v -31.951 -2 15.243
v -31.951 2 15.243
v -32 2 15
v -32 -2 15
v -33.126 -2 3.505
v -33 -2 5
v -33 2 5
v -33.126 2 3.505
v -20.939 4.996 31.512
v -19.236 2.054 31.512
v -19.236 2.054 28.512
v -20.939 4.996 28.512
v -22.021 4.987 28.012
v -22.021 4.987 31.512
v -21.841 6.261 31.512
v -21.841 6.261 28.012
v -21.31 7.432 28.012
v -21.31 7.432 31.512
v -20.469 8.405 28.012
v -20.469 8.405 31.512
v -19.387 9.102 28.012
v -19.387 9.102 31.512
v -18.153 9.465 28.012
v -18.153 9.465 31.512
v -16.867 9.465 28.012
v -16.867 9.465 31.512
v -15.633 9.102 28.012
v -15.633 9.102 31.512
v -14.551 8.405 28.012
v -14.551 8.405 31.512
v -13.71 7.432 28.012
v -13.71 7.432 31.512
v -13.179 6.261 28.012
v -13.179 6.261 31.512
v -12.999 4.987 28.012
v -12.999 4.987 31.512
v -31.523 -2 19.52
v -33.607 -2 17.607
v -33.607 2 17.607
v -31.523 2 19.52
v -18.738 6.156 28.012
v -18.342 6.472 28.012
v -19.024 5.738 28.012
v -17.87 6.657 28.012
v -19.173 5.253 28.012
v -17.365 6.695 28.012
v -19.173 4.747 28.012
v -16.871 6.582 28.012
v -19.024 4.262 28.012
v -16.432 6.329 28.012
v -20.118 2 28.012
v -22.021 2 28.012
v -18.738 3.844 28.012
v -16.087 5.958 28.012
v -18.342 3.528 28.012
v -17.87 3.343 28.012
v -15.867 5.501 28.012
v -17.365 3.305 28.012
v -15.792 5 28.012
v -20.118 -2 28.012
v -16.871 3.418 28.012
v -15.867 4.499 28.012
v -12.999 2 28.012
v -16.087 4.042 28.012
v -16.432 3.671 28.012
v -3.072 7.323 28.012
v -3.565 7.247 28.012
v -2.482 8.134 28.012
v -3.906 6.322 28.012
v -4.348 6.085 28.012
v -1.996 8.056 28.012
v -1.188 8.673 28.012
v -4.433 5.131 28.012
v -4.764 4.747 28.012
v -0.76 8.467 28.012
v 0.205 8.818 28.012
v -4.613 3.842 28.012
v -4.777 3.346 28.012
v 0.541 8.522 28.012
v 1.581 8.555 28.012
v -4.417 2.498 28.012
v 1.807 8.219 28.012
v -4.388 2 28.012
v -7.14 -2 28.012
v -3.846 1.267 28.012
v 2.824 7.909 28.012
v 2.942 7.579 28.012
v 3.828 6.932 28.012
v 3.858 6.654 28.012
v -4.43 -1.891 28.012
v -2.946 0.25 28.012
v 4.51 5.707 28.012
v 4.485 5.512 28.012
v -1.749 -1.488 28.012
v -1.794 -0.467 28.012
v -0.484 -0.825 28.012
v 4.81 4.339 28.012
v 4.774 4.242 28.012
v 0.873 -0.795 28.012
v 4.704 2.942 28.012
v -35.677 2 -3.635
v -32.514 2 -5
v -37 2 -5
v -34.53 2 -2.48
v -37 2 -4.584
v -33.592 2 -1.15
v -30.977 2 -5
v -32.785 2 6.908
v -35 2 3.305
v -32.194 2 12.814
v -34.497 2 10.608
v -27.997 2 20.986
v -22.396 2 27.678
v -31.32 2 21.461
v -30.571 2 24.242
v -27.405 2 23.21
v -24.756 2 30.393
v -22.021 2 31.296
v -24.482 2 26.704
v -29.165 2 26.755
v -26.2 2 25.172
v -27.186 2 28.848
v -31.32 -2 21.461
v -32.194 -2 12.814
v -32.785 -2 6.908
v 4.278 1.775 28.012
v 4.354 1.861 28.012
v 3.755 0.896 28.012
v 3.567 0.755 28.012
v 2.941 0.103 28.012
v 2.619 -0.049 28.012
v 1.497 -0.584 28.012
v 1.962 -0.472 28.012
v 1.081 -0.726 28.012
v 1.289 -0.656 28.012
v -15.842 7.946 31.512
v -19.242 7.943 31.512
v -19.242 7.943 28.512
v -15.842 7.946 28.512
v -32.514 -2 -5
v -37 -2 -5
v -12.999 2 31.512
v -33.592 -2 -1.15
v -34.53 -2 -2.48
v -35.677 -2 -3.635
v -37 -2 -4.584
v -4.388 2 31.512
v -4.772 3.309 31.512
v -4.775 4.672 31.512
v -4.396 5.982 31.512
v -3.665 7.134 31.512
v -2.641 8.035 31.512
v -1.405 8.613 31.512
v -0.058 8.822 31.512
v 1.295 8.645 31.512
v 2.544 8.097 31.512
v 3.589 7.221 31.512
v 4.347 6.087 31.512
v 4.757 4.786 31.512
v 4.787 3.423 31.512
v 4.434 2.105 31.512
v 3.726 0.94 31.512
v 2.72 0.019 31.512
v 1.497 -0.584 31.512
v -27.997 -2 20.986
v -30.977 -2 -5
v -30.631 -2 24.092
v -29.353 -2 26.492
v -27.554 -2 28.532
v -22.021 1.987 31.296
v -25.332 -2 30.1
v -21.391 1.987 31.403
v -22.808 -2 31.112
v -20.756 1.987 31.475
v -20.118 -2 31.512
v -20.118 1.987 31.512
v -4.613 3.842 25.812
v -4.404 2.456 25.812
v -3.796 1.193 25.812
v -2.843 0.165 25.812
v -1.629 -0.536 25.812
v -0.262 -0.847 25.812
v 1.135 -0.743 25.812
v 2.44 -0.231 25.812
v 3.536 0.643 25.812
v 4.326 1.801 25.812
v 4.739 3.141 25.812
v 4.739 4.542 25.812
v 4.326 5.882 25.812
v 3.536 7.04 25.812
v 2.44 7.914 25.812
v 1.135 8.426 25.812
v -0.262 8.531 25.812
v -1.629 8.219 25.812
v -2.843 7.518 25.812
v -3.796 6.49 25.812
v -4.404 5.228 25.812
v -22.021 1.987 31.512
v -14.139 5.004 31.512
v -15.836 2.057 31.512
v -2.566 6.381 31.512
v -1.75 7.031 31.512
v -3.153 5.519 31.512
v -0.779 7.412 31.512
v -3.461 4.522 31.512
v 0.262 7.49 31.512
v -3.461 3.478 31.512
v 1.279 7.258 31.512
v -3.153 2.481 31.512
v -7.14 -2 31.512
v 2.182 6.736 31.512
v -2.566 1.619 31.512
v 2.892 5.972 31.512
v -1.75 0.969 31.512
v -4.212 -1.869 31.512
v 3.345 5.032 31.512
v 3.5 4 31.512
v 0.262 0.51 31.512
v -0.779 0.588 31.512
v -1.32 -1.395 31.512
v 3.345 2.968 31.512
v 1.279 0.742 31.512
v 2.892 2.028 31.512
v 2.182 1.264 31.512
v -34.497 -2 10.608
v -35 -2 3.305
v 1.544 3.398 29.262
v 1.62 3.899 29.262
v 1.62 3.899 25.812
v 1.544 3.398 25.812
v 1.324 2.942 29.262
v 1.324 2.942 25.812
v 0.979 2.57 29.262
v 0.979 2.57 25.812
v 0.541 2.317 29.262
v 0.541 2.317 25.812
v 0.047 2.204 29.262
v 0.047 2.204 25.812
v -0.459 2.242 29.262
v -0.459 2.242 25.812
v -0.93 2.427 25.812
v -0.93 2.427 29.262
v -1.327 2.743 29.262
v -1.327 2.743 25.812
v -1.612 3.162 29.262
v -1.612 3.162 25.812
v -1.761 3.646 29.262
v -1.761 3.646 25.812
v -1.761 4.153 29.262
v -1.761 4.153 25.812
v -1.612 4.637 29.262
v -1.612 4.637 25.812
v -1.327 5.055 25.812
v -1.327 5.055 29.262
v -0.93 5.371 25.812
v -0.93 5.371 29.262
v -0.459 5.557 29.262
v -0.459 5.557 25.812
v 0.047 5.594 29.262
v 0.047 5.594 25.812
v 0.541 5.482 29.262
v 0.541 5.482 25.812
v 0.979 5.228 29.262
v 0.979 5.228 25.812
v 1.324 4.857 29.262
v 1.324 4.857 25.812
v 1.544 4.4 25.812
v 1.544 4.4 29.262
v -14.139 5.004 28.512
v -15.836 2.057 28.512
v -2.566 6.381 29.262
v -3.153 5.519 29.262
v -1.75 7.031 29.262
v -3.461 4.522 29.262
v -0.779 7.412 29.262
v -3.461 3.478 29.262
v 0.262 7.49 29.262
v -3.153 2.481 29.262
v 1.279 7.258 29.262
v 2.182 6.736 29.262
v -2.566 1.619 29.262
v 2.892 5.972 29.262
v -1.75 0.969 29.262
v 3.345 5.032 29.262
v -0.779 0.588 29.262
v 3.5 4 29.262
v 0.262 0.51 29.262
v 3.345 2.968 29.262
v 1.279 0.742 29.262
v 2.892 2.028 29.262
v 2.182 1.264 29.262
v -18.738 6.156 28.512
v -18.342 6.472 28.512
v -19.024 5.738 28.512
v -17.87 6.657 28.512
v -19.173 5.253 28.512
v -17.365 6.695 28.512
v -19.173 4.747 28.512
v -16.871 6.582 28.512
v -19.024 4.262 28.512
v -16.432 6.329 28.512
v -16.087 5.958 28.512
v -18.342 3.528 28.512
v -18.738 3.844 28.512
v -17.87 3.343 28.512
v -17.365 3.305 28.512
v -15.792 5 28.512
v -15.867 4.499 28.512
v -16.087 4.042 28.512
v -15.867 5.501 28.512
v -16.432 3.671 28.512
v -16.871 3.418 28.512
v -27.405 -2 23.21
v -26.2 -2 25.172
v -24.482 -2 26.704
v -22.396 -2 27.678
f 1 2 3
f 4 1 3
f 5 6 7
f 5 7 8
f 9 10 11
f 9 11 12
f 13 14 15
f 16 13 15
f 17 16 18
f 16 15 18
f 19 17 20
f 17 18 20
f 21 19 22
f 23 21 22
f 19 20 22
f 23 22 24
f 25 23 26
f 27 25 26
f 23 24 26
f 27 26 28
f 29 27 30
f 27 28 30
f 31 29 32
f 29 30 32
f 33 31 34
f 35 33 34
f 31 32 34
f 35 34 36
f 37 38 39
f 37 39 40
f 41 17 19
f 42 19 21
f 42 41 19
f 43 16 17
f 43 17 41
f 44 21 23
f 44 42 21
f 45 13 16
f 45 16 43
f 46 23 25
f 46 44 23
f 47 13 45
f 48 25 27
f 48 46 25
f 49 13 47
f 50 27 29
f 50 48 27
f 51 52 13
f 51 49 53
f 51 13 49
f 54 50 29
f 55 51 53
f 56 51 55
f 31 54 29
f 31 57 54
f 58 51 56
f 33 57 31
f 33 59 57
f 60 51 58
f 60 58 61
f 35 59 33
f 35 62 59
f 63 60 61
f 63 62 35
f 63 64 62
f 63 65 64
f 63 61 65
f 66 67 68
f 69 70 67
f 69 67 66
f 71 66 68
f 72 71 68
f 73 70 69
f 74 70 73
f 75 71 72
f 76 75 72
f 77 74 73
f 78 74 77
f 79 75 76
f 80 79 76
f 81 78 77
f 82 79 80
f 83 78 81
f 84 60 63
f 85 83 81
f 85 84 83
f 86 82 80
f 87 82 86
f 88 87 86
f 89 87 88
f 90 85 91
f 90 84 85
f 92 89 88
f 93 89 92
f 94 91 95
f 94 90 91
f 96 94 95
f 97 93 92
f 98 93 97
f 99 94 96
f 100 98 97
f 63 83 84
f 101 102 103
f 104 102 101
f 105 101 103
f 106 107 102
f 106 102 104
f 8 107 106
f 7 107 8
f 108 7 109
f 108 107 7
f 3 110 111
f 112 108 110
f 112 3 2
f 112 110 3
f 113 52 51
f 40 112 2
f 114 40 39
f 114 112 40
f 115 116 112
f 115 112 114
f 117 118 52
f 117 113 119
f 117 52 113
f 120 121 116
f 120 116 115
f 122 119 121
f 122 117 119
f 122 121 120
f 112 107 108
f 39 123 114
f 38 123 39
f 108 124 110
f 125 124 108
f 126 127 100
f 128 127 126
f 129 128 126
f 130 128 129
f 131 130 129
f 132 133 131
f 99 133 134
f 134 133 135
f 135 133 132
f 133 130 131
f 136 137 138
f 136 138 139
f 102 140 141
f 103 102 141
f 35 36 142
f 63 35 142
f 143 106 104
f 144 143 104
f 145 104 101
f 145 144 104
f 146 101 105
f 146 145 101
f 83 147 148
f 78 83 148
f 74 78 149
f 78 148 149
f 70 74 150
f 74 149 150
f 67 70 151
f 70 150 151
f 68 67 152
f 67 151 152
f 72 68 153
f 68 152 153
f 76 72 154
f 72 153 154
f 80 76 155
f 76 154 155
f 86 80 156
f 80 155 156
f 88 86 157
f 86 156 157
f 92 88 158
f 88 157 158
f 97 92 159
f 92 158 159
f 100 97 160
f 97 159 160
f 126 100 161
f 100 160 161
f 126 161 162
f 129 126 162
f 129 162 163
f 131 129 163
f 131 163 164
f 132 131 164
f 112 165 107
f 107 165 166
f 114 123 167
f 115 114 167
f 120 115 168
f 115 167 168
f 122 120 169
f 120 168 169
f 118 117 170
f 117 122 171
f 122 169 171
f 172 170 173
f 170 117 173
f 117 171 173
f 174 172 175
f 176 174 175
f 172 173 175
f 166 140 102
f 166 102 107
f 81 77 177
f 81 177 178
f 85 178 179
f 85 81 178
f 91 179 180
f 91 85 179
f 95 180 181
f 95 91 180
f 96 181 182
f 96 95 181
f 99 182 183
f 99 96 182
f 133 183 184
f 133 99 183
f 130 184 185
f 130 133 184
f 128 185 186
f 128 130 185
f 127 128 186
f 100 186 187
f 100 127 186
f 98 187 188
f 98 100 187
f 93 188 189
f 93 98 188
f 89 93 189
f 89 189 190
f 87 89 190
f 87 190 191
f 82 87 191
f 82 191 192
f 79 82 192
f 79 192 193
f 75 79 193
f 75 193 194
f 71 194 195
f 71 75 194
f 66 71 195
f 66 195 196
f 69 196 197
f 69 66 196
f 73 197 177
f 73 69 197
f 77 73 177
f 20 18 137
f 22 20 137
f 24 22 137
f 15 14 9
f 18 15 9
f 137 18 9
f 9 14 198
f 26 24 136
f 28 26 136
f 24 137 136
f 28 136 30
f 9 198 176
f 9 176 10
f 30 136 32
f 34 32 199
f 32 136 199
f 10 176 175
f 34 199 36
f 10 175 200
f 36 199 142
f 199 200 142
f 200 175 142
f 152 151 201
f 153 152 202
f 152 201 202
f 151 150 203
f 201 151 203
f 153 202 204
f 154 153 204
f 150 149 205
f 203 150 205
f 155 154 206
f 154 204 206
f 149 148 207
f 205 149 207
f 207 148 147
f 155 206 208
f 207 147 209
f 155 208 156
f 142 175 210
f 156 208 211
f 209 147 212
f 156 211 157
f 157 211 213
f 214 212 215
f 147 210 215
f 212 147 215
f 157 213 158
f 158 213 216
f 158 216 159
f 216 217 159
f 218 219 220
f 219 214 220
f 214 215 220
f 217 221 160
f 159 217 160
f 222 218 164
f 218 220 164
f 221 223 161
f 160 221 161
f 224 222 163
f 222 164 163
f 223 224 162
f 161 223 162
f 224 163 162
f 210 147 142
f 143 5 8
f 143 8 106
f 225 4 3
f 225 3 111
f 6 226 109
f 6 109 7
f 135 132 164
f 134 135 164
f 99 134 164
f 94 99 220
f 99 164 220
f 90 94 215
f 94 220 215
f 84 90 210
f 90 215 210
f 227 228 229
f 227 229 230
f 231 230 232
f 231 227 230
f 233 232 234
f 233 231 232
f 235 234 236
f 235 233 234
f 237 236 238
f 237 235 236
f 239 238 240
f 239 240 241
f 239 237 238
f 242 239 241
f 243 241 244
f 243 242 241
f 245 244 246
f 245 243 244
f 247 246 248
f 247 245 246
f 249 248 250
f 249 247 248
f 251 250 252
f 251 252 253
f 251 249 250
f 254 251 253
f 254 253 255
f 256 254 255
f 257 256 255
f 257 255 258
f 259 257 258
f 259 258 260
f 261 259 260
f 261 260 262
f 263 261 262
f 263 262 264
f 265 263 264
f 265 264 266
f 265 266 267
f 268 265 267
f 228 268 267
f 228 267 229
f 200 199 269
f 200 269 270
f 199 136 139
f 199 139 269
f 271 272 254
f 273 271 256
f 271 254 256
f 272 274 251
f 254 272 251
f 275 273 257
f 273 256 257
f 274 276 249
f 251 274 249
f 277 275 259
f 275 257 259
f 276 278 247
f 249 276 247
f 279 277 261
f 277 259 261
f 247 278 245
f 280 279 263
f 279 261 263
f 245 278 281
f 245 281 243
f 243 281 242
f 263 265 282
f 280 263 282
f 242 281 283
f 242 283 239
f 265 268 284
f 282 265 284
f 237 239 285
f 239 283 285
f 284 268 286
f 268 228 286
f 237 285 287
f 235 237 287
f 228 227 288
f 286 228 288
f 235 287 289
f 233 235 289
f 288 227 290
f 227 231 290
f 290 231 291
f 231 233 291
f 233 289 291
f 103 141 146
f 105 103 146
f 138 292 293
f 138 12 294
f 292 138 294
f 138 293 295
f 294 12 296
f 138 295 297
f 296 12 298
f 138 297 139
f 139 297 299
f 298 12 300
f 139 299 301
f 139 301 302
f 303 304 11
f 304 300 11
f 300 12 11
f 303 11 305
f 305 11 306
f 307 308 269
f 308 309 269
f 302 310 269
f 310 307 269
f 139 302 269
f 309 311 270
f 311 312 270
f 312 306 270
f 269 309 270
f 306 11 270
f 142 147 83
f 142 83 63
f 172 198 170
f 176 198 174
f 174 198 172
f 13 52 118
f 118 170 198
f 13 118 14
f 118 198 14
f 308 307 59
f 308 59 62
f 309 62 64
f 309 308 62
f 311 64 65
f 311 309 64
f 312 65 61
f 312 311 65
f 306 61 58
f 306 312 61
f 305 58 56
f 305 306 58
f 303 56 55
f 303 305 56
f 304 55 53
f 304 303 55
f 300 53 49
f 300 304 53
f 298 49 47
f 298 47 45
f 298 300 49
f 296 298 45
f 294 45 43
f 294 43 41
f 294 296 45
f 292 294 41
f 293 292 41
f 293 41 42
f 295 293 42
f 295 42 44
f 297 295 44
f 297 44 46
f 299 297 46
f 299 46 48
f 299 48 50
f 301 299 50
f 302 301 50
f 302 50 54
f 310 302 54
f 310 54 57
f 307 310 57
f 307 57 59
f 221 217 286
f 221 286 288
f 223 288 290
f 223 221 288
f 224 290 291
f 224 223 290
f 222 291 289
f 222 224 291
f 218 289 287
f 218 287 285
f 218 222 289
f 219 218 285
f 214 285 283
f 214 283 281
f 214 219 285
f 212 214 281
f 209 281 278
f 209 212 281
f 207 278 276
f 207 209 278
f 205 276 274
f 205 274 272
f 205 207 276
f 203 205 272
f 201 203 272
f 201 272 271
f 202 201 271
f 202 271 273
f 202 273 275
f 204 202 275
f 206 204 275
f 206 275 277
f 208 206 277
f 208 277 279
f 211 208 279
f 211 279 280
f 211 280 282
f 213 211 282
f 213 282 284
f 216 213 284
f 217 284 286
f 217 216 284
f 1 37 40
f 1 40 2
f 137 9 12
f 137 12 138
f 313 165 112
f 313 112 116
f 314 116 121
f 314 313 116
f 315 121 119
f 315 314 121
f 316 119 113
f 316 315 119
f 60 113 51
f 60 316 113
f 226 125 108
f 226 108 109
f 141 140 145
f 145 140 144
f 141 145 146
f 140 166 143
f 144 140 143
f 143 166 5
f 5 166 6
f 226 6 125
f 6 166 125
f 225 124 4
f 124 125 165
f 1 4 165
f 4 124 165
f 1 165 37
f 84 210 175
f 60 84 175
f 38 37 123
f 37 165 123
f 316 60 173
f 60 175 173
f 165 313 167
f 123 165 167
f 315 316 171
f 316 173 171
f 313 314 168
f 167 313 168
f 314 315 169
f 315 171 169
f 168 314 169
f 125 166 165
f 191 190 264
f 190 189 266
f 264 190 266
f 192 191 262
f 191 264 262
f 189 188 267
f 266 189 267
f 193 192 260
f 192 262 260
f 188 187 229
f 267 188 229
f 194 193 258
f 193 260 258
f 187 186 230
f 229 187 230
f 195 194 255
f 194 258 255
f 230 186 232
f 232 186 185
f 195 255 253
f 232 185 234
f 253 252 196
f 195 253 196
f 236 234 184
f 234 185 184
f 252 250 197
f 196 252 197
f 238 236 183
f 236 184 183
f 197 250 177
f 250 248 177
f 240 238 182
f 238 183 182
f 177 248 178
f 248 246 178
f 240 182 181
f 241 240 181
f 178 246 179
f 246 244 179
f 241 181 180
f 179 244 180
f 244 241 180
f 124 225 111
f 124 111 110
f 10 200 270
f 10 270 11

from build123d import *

# Parameters (mm, degrees)
PAD073_DEPTH       = 2
PAD074_DEPTH       = 3.5
SKETCH122_R        = 3.5
POCKET003054_DEPTH = 2.25
SKETCH123_R        = 4.702209
PAD075_DEPTH       = 2.2
SKETCH124_R        = 1.7
POCKET003055_DEPTH = 5
PAD076_DEPTH       = 3.5
SKETCH126_R        = 1.7
POCKET003056_DEPTH = 5
POCKET003057_DEPTH = 3
PAD078_DEPTH       = 4


with BuildPart() as v4_non_servo_sg90_leg001:
    # Sketch120 → Pad073 (new body, symmetric)
    with BuildSketch(Plane.XZ):
        with BuildLine():
            Line((7.19326, 28.01235), (20.118014, 28.01235))
            ThreePointArc((27.996703, 20.985646), (25.396468, 26.000474), (20.118014, 28.01235))
            Line((27.996703, 20.985646), (30.977077, -4.999855))
            Line((33.977077, -4.999855), (30.977077, -4.999855))
            Line((31.375084, 21.001564), (33.977077, -4.999855))
            ThreePointArc((31.375084, 21.001564), (27.724482, 28.375326), (20.118014, 31.51235))
            Line((7.19326, 31.51235), (20.118014, 31.51235))
            Line((7.19326, 28.01235), (7.19326, 31.51235))
        make_face()
    extrude(amount=PAD073_DEPTH, both=True)

    # Sketch121 → Pad074 (new body)
    with BuildSketch(Plane(origin=(0, 0, 31.51235), x_dir=(-1, 0, 0), z_dir=(0, 0, 1))):
        with BuildLine():
            Line((-18, 2), (-18, -2))
            Line((-18, -2), (-4.3876, -2))
            ThreePointArc((-4.3876, -2), (1.938593, -8.415251), (1.496731, 0.583689))
            ThreePointArc((1.496731, 0.583689), (-2.758605, 1.674941), (-7.139591, 2))
            Line((-18, 2), (-7.139591, 2))
        make_face()
    extrude(amount=-PAD074_DEPTH)

    # Sketch122 → Pocket003054 (cut)
    with BuildSketch(Plane(origin=(0, 0, 31.51235), x_dir=(-1, 0, 0), z_dir=(0, 0, 1))):
        with Locations((0, -4)):
            Circle(SKETCH122_R)
    extrude(amount=-POCKET003054_DEPTH, mode=Mode.SUBTRACT)

    # Sketch123 → Pad075 (new body)
    with BuildSketch(Plane(origin=(0, 0, 28.01235), x_dir=(1, 0, 0), z_dir=(0, 0, -1))):
        with Locations((-0.089106, -3.841625)):
            Circle(SKETCH123_R)
    extrude(amount=PAD075_DEPTH)

    # Sketch124 → Pocket003055 (cut)
    with BuildSketch(Plane(origin=(0, 0, 29.26235), x_dir=(-1, 0, 0), z_dir=(0, 0, 1))):
        with Locations((-0.080471, -3.899184)):
            Circle(SKETCH124_R)
    extrude(amount=-POCKET003055_DEPTH, mode=Mode.SUBTRACT)

    # Sketch125 → Pad076 (new body)
    with BuildSketch(Plane(origin=(0, 0, 31.51235), x_dir=(-1, 0, 0), z_dir=(0, 0, 1))):
        with BuildLine():
            Line((-22.021201, -1.987049), (-22.021201, -4.986919))
            ThreePointArc((-22.021201, -4.986919), (-17.510002, -9.511218), (-12.998803, -4.986919))
            Line((-12.998803, -4.986919), (-12.998803, -1.987049))
            Line((-22.021201, -1.987049), (-12.998803, -1.987049))
        make_face()
    extrude(amount=-PAD076_DEPTH)

    # Sketch126 → Pocket003056 (cut)
    with BuildSketch(Plane(origin=(0, 0, 31.51235), x_dir=(-1, 0, 0), z_dir=(0, 0, 1))):
        with Locations((-17.491917, -5)):
            Circle(SKETCH126_R)
    extrude(amount=-POCKET003056_DEPTH, mode=Mode.SUBTRACT)

    # Sketch127 → Pocket003057 (cut)
    with BuildSketch(Plane(origin=(0, 0, 31.51235), x_dir=(-1, 0, 0), z_dir=(0, 0, 1))):
        Polygon((-14.138998, -5.003928), (-15.835596, -2.057479), (-19.235593, -2.053552), (-20.938994, -4.996072), (-19.242396, -7.942521), (-15.842399, -7.946448), align=None)
    extrude(amount=-POCKET003057_DEPTH, mode=Mode.SUBTRACT)

    # Sketch128 → Pad078 (new body)
    with BuildSketch(Plane.XZ.offset(2)):
        with BuildLine():
            Line((27, 28.536497), (32.513573, -5))
            Line((32.513573, -5), (37.000002, -5))
            Line((37.000002, -5), (37.000002, -4.583553))
            ThreePointArc((33.505627, -1), (35.019116, -3.019659), (37.000002, -4.583553))
            Line((33, 5), (33.505627, -1))
            Line((35, 3.304739), (33, 5))
            Line((32.728943, 7), (35, 3.304739))
            Line((32, 13), (32.728943, 7))
            Line((34.496559, 10.608005), (32, 13))
            Line((32, 15), (34.496559, 10.608005))
            Line((31, 20), (32, 15))
            Line((33.606815, 17.606869), (31, 20))
            Line((31, 22), (33.606815, 17.606869))
            Line((27, 28.536497), (31, 22))
        make_face()
    extrude(amount=-PAD078_DEPTH)


with BuildPart() as part_mirroring013:
    # Part__Mirroring013: instance of V4_non_servo_SG90_leg001
    add(v4_non_servo_sg90_leg001.part.mirror(Plane(origin=(0, 0, 0), x_dir=(0, -1, 0), z_dir=(1, 0, 0))))


solid = part_mirroring013.part
